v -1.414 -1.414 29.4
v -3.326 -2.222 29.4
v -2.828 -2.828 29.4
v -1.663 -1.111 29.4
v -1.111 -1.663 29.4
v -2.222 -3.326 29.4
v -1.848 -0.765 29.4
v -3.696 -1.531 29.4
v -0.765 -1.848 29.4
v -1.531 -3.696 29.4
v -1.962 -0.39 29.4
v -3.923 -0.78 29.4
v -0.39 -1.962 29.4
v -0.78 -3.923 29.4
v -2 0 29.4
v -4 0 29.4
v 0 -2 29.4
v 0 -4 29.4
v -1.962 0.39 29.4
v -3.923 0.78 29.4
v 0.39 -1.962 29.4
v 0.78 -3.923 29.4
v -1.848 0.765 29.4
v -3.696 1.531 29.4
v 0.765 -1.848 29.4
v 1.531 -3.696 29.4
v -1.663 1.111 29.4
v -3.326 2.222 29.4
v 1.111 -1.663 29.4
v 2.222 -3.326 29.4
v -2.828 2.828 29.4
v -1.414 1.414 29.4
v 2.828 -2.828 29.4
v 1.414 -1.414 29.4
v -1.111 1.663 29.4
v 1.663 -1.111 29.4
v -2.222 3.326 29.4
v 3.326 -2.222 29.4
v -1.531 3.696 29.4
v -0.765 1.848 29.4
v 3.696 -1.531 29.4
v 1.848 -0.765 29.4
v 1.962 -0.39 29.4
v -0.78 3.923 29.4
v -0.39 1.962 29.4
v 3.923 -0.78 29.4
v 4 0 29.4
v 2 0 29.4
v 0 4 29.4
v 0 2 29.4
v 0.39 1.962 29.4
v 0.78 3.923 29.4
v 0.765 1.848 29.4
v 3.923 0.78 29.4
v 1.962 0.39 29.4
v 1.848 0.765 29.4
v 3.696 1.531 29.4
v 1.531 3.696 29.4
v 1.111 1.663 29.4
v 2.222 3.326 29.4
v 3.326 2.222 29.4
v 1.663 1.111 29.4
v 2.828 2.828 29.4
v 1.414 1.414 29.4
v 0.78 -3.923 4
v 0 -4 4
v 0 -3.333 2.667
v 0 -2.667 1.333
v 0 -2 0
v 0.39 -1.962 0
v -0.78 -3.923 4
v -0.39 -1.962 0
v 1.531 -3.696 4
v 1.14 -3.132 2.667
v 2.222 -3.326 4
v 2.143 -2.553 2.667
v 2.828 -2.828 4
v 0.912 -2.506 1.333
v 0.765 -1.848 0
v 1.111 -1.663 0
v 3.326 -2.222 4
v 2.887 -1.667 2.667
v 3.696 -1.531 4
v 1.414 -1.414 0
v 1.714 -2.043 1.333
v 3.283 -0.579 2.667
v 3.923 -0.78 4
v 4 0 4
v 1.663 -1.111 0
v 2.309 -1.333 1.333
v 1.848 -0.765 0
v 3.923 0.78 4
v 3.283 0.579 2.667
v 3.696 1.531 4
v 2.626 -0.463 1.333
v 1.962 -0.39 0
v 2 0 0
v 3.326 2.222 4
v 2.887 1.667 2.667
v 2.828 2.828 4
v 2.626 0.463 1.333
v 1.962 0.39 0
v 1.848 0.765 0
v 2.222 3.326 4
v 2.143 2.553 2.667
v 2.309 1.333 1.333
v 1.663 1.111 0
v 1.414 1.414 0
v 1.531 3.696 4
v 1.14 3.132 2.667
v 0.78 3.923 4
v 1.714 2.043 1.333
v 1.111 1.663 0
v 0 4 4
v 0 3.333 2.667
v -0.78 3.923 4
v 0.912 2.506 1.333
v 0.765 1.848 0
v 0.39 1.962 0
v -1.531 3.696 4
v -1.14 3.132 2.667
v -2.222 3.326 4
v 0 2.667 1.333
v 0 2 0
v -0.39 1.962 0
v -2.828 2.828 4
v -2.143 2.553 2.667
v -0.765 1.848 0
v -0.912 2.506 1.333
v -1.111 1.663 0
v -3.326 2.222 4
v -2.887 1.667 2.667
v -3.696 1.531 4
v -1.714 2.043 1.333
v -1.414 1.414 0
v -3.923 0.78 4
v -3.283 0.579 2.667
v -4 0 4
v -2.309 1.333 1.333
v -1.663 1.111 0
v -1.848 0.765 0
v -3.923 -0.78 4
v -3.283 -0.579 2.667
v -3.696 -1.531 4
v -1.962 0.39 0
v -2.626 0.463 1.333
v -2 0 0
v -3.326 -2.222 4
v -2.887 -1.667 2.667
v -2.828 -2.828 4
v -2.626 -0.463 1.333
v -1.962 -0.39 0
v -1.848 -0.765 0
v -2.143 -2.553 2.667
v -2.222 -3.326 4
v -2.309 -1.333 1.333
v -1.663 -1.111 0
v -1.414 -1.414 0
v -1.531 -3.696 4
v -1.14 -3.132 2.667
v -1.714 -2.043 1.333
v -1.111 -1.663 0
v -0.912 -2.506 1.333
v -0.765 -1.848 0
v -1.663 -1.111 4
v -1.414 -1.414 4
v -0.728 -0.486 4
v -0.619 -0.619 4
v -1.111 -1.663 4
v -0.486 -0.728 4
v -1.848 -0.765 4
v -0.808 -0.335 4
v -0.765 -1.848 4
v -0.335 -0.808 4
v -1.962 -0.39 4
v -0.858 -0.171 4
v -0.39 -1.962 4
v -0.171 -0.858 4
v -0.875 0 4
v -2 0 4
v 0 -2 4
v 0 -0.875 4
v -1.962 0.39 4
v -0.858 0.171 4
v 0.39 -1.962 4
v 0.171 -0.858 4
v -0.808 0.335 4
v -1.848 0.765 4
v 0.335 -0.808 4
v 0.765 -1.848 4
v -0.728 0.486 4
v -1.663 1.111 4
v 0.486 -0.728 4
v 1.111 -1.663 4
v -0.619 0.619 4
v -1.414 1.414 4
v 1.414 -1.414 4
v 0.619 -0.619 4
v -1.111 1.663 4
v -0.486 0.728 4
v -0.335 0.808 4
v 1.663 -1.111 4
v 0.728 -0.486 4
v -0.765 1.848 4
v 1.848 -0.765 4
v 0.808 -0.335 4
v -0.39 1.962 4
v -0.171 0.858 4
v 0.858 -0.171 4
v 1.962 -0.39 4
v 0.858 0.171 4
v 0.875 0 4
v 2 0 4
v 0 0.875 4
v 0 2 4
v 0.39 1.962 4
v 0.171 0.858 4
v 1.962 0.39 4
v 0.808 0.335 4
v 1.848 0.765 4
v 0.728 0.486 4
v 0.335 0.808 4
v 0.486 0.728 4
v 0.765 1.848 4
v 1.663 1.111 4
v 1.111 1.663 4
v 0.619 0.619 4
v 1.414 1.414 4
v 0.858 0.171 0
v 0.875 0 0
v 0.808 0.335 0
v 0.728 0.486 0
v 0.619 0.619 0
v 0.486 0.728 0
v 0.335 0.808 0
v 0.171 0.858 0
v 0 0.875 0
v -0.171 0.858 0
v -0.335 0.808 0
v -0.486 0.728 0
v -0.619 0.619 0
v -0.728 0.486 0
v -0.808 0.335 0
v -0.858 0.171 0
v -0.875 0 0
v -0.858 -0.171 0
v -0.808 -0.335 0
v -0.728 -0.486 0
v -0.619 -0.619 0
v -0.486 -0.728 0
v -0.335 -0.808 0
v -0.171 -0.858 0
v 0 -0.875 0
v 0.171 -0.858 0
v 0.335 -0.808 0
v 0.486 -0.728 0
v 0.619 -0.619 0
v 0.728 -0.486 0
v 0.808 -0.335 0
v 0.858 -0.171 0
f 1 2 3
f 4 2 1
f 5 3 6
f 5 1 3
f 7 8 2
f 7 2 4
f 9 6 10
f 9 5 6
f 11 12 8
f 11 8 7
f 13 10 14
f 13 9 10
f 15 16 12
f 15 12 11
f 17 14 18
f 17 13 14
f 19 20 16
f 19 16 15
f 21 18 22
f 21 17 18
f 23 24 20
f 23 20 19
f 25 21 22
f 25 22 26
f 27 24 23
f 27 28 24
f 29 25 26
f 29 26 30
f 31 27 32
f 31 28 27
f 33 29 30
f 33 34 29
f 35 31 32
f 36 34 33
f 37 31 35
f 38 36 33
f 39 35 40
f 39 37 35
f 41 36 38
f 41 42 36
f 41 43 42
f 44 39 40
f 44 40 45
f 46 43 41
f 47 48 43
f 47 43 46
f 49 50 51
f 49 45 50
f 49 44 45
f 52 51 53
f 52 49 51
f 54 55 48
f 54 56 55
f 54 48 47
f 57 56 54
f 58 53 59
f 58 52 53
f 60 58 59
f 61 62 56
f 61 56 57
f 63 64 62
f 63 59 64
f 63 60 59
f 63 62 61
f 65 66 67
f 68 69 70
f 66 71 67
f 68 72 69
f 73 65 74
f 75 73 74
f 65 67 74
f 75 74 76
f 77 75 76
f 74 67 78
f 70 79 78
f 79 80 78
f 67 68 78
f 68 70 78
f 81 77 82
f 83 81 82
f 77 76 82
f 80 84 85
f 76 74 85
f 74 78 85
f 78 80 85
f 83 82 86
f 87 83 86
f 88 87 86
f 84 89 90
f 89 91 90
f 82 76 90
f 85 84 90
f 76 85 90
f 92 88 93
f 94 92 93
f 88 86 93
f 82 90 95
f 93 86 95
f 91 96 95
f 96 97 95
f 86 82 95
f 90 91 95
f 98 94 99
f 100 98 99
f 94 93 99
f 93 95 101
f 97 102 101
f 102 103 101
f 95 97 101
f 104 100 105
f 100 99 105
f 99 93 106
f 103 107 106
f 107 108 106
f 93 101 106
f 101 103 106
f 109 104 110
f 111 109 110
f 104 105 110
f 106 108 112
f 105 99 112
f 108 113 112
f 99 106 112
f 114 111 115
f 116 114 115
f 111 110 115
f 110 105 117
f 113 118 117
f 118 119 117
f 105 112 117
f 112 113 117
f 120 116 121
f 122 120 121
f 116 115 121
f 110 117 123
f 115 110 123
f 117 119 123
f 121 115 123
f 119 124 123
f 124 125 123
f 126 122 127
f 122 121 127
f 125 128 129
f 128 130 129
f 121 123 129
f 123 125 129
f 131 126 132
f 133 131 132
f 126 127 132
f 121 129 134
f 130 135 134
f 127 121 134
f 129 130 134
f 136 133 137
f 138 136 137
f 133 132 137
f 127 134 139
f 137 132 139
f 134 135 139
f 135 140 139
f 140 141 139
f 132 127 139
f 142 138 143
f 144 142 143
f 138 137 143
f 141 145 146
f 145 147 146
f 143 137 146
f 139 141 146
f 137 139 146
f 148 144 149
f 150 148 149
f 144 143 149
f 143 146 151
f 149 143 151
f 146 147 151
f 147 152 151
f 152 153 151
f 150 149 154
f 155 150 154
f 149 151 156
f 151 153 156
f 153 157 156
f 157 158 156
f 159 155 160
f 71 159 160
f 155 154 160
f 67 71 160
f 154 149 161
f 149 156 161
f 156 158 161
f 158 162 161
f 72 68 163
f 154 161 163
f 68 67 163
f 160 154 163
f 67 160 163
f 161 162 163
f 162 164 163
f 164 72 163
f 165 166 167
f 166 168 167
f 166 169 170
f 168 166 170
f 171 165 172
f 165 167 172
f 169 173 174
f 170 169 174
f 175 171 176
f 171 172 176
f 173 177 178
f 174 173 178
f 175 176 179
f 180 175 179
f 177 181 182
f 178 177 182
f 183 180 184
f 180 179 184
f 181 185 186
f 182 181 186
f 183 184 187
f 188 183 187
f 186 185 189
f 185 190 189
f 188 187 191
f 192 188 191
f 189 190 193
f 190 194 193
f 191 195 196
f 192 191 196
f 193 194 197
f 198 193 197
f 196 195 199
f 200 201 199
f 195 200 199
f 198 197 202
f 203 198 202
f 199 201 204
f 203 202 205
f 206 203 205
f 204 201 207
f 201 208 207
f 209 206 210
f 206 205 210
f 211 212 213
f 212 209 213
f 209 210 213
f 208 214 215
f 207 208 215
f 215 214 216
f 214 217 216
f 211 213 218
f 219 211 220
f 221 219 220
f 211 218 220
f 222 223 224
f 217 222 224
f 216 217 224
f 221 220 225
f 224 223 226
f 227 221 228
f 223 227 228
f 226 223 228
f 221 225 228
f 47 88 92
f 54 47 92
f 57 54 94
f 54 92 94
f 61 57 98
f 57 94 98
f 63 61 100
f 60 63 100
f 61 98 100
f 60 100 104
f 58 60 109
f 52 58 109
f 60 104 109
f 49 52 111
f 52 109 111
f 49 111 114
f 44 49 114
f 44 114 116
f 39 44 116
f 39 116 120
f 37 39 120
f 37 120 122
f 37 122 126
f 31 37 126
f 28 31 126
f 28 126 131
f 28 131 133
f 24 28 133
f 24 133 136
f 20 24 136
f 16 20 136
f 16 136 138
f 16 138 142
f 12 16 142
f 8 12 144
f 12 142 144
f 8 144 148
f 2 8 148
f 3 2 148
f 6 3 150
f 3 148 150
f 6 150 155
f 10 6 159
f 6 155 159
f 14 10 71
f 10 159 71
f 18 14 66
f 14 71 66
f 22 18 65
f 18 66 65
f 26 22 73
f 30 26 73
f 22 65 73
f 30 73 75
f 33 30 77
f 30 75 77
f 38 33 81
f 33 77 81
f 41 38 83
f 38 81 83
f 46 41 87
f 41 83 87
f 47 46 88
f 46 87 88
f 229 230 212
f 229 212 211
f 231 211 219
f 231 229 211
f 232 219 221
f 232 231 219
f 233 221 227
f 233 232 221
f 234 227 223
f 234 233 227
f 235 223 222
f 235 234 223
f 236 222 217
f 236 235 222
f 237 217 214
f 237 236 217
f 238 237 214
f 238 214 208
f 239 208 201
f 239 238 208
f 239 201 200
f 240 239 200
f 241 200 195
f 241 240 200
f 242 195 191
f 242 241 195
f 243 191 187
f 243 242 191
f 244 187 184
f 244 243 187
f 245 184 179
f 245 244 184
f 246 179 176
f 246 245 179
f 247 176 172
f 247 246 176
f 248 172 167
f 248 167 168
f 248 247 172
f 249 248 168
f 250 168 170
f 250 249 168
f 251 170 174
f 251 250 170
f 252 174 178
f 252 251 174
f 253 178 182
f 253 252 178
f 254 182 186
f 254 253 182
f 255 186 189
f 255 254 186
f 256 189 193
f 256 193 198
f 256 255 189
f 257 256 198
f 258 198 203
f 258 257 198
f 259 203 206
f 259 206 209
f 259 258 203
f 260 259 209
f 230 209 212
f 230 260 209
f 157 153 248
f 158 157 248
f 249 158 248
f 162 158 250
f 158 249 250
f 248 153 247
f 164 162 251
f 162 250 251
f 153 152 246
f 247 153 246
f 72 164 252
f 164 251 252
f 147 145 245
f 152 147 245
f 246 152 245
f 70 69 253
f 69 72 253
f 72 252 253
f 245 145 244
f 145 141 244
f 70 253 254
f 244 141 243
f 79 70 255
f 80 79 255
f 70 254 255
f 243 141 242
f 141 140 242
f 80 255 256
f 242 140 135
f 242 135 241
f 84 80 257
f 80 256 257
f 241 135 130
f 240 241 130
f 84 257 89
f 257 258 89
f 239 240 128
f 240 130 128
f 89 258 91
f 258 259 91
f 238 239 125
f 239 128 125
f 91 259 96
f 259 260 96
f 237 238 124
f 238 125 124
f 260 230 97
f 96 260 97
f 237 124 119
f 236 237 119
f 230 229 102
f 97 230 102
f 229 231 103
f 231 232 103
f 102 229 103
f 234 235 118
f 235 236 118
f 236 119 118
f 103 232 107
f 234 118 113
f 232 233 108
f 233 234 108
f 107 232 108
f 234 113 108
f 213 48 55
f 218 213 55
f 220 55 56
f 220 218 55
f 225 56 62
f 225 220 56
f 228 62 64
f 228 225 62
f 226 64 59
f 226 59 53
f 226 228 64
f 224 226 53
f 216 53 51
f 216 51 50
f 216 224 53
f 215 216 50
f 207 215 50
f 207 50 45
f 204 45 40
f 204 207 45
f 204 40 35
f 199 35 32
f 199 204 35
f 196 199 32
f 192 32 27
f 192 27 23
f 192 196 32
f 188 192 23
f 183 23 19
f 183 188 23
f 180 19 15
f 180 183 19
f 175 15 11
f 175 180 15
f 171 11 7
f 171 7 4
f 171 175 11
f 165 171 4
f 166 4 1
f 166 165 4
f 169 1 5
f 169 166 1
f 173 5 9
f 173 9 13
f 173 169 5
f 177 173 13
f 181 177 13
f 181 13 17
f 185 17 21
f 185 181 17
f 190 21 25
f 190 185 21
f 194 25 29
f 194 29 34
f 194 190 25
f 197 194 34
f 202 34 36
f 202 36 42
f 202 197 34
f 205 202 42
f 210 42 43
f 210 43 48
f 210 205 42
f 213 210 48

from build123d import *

# Parameters (mm, degrees)
F0_R     = 2
F0_R_2   = 0.875
F1_DEPTH = 4
F6_R     = 4
F6_R_2   = 2
F7_DEPTH = 25.4


with BuildPart() as f1:
    # F0 (on Top) → F1 (new body)
    with BuildSketch(Plane.XY):
        Circle(F0_R)
        Circle(F0_R_2, mode=Mode.SUBTRACT)
    extrude(amount=F1_DEPTH)

    # F4 (on Right) → F5 (revolve)
    with BuildSketch(Plane.YZ):
        Polygon((-1.583964, 4), (-4, 4), (-2, 0), (-1.583964, 0), align=None)
    revolve(axis=Axis((0, 0, 1.998599), (0, 0, 1)))

    # F6 (on face) → F7 (join)
    with BuildSketch(Plane.XY.offset(4)):
        Circle(F6_R)
        Circle(F6_R_2, mode=Mode.SUBTRACT)
    extrude(amount=F7_DEPTH)


solid = f1.part
